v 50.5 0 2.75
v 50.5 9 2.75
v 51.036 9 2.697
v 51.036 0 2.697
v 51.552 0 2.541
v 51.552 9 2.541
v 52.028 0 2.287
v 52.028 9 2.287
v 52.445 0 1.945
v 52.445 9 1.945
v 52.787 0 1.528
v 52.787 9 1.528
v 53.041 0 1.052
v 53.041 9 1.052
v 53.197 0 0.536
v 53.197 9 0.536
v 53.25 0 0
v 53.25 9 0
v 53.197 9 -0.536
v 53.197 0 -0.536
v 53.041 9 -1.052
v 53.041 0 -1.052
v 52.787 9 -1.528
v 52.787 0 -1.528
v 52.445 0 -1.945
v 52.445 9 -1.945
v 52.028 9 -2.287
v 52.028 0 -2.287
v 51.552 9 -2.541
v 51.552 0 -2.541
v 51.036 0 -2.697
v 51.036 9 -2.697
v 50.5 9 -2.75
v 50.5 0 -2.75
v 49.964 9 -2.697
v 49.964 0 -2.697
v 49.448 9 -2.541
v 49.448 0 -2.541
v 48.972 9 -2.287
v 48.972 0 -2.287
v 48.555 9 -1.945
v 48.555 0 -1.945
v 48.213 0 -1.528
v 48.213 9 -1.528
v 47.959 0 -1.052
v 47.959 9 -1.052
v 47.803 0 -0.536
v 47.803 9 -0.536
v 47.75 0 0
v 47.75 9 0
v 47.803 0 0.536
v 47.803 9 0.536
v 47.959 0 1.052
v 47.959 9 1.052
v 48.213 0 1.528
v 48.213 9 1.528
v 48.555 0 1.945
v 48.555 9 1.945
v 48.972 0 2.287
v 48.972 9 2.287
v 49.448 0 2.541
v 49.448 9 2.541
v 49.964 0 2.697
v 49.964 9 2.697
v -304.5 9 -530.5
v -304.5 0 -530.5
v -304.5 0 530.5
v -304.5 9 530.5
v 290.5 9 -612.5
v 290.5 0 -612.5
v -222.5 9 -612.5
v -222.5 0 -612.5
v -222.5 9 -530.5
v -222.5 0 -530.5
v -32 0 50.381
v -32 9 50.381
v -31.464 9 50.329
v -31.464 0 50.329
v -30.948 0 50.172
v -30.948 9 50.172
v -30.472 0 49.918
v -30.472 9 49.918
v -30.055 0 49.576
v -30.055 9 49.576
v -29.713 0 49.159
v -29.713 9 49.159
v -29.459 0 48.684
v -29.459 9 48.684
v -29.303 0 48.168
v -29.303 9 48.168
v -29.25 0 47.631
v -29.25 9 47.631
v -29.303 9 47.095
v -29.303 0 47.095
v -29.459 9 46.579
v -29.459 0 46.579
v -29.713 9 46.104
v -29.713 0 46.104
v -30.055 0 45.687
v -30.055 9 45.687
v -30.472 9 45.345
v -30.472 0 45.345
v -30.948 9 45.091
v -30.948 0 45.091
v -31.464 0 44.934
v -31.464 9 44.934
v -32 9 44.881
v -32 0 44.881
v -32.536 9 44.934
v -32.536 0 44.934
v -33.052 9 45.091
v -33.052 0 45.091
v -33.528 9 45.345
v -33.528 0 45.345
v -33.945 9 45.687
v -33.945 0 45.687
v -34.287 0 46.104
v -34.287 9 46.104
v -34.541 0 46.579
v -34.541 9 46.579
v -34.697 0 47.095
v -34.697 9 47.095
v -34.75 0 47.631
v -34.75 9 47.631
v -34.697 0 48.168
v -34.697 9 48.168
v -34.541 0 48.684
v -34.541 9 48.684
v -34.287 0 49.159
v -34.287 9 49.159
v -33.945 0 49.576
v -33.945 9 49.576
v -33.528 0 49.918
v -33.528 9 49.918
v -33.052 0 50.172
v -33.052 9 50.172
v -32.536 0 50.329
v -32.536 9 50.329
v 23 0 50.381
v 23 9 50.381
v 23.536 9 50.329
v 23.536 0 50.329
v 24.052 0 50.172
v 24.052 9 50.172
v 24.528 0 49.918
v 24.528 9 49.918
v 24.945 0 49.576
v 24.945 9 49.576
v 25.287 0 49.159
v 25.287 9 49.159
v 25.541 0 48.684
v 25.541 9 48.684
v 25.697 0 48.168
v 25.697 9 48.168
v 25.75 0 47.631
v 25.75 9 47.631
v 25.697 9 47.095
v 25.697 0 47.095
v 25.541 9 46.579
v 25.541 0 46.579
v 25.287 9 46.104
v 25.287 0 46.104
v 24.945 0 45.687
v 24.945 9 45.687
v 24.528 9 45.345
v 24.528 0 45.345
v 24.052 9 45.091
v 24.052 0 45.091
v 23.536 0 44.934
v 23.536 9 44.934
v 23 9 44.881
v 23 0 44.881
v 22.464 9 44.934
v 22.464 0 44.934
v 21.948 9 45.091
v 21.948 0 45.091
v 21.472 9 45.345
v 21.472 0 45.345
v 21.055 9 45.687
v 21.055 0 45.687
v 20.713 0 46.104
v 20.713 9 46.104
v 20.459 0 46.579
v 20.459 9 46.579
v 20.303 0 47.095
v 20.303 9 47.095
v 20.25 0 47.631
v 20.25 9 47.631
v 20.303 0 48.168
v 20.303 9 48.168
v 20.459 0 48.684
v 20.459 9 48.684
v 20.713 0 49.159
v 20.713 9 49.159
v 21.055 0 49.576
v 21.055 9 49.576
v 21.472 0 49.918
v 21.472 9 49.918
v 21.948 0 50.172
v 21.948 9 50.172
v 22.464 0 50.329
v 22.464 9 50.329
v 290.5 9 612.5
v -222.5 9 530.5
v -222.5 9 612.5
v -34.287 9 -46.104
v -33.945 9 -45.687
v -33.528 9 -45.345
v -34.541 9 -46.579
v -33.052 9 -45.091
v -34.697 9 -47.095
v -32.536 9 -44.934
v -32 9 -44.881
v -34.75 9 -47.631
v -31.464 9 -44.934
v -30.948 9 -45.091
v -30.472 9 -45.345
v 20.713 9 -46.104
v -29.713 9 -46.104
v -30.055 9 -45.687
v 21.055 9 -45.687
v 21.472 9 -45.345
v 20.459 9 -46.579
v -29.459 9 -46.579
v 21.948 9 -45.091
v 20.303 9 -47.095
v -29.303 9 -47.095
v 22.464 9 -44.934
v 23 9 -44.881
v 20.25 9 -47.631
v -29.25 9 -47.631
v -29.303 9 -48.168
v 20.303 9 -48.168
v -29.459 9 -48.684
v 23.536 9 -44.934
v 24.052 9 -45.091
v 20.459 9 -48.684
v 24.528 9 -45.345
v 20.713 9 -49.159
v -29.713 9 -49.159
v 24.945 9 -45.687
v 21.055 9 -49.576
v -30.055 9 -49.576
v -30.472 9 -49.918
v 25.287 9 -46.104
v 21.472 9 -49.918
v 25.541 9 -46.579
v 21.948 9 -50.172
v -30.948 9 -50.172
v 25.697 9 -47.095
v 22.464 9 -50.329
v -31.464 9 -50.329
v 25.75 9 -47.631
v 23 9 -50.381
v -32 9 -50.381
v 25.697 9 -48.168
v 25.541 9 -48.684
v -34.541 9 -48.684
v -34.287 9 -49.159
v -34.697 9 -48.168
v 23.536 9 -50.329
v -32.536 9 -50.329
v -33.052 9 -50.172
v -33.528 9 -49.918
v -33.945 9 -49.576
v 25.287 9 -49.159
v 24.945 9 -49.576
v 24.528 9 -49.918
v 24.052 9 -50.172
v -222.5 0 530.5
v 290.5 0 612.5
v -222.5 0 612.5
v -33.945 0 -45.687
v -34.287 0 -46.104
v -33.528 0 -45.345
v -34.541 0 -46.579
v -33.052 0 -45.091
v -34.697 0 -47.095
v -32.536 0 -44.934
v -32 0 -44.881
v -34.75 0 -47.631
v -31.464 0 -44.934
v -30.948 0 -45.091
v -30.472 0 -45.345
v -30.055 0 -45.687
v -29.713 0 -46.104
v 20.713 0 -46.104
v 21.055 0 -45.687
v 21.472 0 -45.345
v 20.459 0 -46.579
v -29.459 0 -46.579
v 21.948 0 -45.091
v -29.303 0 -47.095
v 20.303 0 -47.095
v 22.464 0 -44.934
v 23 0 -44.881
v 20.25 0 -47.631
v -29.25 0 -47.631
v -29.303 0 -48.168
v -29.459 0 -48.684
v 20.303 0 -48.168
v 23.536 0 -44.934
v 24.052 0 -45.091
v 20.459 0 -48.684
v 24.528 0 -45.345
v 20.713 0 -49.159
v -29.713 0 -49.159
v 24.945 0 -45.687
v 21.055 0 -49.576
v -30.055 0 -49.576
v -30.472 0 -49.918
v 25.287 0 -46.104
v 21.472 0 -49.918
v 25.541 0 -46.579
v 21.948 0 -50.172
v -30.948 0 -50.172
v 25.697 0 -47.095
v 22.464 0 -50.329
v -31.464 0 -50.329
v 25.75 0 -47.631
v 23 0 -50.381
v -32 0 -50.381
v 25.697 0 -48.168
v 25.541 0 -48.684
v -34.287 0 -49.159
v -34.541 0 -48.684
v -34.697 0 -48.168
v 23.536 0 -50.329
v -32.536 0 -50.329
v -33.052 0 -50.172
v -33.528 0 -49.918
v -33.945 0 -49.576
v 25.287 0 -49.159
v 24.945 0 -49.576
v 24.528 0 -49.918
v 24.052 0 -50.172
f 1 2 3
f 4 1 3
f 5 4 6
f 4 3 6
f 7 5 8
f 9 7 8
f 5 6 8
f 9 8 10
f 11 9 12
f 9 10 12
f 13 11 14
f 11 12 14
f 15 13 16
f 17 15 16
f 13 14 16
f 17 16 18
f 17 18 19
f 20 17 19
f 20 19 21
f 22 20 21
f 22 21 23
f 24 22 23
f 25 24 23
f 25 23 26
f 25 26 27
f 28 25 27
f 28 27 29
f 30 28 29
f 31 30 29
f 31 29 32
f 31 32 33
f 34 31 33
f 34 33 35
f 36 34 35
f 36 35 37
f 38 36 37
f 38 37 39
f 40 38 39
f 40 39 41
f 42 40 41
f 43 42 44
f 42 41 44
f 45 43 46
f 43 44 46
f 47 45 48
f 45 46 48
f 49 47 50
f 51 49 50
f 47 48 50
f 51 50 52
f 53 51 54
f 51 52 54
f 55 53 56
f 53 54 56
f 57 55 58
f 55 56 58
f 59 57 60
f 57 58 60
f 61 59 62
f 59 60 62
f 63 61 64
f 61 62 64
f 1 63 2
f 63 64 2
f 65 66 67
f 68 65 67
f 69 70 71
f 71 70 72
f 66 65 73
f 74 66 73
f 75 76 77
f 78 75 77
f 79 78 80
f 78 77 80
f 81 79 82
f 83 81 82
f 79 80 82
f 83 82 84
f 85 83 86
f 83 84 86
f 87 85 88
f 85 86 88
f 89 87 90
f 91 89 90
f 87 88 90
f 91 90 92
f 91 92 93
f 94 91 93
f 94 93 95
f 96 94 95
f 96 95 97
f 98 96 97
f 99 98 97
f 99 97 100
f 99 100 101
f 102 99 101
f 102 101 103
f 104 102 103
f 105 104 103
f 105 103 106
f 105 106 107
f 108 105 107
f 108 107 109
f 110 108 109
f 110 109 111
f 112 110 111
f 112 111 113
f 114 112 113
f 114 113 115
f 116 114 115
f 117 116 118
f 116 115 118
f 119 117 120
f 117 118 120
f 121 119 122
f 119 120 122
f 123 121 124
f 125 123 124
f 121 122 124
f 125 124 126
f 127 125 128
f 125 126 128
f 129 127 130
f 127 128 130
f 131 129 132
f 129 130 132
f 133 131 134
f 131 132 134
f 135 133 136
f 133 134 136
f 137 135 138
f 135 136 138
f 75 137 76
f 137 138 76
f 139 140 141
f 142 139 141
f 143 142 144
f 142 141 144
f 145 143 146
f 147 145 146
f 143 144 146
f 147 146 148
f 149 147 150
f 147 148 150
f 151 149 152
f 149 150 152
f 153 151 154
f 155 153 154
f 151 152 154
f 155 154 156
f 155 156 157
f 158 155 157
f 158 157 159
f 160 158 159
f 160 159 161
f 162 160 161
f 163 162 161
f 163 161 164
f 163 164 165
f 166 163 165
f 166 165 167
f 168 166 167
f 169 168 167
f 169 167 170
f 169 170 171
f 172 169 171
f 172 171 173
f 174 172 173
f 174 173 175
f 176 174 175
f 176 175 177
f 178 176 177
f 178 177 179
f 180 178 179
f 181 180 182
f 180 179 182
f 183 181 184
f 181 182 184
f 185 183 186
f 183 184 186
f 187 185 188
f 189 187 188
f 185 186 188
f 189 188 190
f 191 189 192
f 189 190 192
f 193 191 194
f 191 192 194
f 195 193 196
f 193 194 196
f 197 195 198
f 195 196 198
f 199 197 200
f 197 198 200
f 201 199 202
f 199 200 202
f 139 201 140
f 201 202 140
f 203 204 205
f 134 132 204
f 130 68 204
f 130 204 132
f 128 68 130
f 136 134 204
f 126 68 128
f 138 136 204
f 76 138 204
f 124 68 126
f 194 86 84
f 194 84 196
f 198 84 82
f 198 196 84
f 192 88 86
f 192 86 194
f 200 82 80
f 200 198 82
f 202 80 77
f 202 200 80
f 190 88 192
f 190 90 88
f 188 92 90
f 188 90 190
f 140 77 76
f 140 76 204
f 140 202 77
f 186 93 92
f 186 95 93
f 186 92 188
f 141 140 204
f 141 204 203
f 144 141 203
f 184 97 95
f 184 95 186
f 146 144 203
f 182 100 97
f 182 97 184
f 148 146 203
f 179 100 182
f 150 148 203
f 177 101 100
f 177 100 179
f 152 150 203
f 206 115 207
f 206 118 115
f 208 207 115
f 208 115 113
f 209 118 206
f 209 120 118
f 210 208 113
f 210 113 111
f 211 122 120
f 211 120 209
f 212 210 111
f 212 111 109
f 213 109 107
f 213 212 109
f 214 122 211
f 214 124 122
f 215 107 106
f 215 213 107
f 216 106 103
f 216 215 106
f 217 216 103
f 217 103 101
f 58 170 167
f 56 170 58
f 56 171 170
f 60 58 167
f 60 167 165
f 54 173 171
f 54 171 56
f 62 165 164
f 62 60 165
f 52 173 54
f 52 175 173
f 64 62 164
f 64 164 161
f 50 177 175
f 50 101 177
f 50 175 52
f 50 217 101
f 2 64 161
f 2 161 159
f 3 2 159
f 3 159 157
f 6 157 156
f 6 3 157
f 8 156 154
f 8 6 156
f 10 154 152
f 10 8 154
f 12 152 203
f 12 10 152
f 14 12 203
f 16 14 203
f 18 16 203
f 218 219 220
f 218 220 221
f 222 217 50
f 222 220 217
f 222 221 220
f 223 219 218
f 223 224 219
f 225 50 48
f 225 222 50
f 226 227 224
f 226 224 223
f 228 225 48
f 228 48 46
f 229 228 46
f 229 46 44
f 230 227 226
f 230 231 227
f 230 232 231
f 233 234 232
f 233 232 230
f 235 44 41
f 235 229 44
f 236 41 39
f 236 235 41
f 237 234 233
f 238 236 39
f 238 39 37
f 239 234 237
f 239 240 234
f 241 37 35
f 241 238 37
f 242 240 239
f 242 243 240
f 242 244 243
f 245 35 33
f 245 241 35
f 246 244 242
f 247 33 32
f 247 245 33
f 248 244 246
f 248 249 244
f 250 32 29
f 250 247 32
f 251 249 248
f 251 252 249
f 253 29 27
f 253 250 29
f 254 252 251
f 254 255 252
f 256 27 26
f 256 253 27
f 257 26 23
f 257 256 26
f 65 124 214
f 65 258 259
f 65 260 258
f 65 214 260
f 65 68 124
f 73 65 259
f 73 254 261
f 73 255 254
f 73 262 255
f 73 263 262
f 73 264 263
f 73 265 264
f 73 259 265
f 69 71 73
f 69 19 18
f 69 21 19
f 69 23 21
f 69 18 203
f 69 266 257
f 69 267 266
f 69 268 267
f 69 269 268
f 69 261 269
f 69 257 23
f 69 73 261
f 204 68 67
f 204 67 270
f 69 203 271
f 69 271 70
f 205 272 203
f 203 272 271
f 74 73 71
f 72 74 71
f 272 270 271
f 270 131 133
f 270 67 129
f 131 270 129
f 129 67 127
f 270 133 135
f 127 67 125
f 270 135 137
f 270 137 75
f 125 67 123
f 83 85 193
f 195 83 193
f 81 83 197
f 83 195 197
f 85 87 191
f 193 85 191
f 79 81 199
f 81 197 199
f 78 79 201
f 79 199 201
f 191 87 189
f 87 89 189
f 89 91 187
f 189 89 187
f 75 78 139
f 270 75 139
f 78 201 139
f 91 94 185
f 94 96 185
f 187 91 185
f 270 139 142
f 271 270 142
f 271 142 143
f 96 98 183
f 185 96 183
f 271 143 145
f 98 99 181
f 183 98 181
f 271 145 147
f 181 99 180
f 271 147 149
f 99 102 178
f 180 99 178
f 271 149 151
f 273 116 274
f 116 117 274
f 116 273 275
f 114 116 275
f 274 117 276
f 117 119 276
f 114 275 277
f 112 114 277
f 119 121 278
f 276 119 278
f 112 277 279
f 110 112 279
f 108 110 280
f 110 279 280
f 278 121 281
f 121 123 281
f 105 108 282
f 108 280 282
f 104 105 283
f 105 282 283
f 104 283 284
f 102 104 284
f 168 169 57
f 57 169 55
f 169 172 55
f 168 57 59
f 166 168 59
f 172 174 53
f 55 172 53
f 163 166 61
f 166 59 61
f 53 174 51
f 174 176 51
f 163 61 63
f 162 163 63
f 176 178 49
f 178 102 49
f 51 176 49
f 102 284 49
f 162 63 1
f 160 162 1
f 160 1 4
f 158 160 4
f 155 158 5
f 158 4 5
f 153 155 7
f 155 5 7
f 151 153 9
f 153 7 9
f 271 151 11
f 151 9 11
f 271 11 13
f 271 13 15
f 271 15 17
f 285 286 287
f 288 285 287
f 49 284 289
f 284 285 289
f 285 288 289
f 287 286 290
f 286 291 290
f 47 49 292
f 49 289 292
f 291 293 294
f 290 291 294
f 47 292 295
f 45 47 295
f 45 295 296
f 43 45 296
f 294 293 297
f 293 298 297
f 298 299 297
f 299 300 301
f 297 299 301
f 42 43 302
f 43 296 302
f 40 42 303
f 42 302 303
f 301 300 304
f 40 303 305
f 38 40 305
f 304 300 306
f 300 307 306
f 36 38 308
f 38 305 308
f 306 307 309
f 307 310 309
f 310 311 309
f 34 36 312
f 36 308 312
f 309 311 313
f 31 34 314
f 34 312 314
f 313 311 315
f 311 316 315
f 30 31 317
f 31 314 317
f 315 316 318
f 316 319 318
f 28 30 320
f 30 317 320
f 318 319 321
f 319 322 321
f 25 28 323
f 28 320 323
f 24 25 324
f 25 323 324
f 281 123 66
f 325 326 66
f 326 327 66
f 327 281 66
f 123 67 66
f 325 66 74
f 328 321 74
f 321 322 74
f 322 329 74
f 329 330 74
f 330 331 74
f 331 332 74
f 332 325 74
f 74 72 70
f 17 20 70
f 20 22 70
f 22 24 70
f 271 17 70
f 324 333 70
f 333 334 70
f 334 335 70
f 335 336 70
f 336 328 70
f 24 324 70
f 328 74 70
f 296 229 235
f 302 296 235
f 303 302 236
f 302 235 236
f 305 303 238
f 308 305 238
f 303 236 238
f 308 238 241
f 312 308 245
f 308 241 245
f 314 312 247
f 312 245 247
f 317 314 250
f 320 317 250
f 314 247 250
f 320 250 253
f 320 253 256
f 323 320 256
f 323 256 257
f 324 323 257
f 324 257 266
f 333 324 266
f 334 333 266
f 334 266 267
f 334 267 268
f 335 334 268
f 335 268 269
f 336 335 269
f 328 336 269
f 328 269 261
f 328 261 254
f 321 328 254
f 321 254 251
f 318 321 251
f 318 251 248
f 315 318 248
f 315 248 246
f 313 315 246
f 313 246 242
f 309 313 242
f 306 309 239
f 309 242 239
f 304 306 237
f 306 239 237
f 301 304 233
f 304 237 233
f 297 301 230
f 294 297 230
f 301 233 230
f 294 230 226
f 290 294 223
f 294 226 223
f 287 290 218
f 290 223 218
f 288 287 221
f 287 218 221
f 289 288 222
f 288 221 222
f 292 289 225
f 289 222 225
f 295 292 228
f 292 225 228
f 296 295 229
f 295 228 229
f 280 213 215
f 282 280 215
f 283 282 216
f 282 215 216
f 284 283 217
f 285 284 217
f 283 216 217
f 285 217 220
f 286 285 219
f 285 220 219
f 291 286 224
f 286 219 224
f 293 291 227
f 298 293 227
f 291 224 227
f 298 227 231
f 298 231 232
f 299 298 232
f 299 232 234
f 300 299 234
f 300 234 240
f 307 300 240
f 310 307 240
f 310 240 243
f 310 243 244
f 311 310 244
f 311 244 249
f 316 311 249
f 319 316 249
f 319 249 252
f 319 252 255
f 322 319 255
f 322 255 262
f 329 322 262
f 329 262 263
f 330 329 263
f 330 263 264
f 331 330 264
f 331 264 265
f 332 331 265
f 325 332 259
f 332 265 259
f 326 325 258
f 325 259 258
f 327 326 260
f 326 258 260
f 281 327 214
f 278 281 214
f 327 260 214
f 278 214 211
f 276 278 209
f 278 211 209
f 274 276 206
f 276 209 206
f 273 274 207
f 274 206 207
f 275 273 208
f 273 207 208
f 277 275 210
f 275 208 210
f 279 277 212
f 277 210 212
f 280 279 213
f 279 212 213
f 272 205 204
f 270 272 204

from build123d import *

# Parameters (mm, degrees)
BOSS_EXTRUDE1_DEPTH = 9
SKETCH2_W           = 14
SKETCH2_H           = 1225
CUT_EXTRUDE1_DEPTH  = 10
SKETCH3_W           = 82
SKETCH3_H           = 82
CUT_EXTRUDE5_DEPTH  = 10
SKETCH4_R           = 2.75
CUT_EXTRUDE6_DEPTH  = 10


with BuildPart() as part:
    # Sketch1 → Boss-Extrude1 (new body)
    with BuildSketch(Plane(origin=(0, 0, 0), x_dir=(1, 0, 0), z_dir=(0, 1, 0))):
        Polygon((-304.5, -532.5), (-304.5, -612.5), (224.5, -612.5), (304.5, -612.5), (304.5, -532.5), (304.5, 497.5), (304.5, 612.5), (224.5, 612.5), (-304.5, 612.5), (-304.5, 497.5), align=None)
    extrude(amount=BOSS_EXTRUDE1_DEPTH)

    # Sketch2 → Cut-Extrude1 (cut)
    with BuildSketch(Plane(origin=(0, 9, 0), x_dir=(1, 0, 0), z_dir=(0, 1, 0))):
        with Locations((297.5, 0)):
            Rectangle(SKETCH2_W, SKETCH2_H)
    extrude(amount=-CUT_EXTRUDE1_DEPTH, mode=Mode.SUBTRACT)

    # Sketch3 → Cut-Extrude5 (cut)
    with BuildSketch(Plane(origin=(0, 9, 0), x_dir=(1, 0, 0), z_dir=(0, 1, 0))):
        with Locations((-263.5, 571.5)):
            Rectangle(SKETCH3_W, SKETCH3_H)
        with Locations((-263.5, -571.5)):
            Rectangle(SKETCH3_W, SKETCH3_H)
    extrude(amount=-CUT_EXTRUDE5_DEPTH, mode=Mode.SUBTRACT)

    # Sketch4 → Cut-Extrude6 (cut)
    with BuildSketch(Plane(origin=(0, 9, 0), x_dir=(1, 0, 0), z_dir=(0, 1, 0))):
        with Locations(Location((23, 47.631397208, 0), (0, 0, 270))):
            Circle(SKETCH4_R)
        with Locations(Location((-32, -47.631397208, 0), (0, 0, 270))):
            Circle(SKETCH4_R)
        with Locations(Location((23, -47.631397208, 0), (0, 0, 270))):
            Circle(SKETCH4_R)
        with Locations(Location((50.5, 0, 0), (0, 0, 270))):
            Circle(SKETCH4_R)
        with Locations(Location((-32, 47.631397208, 0), (0, 0, 270))):
            Circle(SKETCH4_R)
    extrude(amount=-CUT_EXTRUDE6_DEPTH, mode=Mode.SUBTRACT)


solid = part.part
